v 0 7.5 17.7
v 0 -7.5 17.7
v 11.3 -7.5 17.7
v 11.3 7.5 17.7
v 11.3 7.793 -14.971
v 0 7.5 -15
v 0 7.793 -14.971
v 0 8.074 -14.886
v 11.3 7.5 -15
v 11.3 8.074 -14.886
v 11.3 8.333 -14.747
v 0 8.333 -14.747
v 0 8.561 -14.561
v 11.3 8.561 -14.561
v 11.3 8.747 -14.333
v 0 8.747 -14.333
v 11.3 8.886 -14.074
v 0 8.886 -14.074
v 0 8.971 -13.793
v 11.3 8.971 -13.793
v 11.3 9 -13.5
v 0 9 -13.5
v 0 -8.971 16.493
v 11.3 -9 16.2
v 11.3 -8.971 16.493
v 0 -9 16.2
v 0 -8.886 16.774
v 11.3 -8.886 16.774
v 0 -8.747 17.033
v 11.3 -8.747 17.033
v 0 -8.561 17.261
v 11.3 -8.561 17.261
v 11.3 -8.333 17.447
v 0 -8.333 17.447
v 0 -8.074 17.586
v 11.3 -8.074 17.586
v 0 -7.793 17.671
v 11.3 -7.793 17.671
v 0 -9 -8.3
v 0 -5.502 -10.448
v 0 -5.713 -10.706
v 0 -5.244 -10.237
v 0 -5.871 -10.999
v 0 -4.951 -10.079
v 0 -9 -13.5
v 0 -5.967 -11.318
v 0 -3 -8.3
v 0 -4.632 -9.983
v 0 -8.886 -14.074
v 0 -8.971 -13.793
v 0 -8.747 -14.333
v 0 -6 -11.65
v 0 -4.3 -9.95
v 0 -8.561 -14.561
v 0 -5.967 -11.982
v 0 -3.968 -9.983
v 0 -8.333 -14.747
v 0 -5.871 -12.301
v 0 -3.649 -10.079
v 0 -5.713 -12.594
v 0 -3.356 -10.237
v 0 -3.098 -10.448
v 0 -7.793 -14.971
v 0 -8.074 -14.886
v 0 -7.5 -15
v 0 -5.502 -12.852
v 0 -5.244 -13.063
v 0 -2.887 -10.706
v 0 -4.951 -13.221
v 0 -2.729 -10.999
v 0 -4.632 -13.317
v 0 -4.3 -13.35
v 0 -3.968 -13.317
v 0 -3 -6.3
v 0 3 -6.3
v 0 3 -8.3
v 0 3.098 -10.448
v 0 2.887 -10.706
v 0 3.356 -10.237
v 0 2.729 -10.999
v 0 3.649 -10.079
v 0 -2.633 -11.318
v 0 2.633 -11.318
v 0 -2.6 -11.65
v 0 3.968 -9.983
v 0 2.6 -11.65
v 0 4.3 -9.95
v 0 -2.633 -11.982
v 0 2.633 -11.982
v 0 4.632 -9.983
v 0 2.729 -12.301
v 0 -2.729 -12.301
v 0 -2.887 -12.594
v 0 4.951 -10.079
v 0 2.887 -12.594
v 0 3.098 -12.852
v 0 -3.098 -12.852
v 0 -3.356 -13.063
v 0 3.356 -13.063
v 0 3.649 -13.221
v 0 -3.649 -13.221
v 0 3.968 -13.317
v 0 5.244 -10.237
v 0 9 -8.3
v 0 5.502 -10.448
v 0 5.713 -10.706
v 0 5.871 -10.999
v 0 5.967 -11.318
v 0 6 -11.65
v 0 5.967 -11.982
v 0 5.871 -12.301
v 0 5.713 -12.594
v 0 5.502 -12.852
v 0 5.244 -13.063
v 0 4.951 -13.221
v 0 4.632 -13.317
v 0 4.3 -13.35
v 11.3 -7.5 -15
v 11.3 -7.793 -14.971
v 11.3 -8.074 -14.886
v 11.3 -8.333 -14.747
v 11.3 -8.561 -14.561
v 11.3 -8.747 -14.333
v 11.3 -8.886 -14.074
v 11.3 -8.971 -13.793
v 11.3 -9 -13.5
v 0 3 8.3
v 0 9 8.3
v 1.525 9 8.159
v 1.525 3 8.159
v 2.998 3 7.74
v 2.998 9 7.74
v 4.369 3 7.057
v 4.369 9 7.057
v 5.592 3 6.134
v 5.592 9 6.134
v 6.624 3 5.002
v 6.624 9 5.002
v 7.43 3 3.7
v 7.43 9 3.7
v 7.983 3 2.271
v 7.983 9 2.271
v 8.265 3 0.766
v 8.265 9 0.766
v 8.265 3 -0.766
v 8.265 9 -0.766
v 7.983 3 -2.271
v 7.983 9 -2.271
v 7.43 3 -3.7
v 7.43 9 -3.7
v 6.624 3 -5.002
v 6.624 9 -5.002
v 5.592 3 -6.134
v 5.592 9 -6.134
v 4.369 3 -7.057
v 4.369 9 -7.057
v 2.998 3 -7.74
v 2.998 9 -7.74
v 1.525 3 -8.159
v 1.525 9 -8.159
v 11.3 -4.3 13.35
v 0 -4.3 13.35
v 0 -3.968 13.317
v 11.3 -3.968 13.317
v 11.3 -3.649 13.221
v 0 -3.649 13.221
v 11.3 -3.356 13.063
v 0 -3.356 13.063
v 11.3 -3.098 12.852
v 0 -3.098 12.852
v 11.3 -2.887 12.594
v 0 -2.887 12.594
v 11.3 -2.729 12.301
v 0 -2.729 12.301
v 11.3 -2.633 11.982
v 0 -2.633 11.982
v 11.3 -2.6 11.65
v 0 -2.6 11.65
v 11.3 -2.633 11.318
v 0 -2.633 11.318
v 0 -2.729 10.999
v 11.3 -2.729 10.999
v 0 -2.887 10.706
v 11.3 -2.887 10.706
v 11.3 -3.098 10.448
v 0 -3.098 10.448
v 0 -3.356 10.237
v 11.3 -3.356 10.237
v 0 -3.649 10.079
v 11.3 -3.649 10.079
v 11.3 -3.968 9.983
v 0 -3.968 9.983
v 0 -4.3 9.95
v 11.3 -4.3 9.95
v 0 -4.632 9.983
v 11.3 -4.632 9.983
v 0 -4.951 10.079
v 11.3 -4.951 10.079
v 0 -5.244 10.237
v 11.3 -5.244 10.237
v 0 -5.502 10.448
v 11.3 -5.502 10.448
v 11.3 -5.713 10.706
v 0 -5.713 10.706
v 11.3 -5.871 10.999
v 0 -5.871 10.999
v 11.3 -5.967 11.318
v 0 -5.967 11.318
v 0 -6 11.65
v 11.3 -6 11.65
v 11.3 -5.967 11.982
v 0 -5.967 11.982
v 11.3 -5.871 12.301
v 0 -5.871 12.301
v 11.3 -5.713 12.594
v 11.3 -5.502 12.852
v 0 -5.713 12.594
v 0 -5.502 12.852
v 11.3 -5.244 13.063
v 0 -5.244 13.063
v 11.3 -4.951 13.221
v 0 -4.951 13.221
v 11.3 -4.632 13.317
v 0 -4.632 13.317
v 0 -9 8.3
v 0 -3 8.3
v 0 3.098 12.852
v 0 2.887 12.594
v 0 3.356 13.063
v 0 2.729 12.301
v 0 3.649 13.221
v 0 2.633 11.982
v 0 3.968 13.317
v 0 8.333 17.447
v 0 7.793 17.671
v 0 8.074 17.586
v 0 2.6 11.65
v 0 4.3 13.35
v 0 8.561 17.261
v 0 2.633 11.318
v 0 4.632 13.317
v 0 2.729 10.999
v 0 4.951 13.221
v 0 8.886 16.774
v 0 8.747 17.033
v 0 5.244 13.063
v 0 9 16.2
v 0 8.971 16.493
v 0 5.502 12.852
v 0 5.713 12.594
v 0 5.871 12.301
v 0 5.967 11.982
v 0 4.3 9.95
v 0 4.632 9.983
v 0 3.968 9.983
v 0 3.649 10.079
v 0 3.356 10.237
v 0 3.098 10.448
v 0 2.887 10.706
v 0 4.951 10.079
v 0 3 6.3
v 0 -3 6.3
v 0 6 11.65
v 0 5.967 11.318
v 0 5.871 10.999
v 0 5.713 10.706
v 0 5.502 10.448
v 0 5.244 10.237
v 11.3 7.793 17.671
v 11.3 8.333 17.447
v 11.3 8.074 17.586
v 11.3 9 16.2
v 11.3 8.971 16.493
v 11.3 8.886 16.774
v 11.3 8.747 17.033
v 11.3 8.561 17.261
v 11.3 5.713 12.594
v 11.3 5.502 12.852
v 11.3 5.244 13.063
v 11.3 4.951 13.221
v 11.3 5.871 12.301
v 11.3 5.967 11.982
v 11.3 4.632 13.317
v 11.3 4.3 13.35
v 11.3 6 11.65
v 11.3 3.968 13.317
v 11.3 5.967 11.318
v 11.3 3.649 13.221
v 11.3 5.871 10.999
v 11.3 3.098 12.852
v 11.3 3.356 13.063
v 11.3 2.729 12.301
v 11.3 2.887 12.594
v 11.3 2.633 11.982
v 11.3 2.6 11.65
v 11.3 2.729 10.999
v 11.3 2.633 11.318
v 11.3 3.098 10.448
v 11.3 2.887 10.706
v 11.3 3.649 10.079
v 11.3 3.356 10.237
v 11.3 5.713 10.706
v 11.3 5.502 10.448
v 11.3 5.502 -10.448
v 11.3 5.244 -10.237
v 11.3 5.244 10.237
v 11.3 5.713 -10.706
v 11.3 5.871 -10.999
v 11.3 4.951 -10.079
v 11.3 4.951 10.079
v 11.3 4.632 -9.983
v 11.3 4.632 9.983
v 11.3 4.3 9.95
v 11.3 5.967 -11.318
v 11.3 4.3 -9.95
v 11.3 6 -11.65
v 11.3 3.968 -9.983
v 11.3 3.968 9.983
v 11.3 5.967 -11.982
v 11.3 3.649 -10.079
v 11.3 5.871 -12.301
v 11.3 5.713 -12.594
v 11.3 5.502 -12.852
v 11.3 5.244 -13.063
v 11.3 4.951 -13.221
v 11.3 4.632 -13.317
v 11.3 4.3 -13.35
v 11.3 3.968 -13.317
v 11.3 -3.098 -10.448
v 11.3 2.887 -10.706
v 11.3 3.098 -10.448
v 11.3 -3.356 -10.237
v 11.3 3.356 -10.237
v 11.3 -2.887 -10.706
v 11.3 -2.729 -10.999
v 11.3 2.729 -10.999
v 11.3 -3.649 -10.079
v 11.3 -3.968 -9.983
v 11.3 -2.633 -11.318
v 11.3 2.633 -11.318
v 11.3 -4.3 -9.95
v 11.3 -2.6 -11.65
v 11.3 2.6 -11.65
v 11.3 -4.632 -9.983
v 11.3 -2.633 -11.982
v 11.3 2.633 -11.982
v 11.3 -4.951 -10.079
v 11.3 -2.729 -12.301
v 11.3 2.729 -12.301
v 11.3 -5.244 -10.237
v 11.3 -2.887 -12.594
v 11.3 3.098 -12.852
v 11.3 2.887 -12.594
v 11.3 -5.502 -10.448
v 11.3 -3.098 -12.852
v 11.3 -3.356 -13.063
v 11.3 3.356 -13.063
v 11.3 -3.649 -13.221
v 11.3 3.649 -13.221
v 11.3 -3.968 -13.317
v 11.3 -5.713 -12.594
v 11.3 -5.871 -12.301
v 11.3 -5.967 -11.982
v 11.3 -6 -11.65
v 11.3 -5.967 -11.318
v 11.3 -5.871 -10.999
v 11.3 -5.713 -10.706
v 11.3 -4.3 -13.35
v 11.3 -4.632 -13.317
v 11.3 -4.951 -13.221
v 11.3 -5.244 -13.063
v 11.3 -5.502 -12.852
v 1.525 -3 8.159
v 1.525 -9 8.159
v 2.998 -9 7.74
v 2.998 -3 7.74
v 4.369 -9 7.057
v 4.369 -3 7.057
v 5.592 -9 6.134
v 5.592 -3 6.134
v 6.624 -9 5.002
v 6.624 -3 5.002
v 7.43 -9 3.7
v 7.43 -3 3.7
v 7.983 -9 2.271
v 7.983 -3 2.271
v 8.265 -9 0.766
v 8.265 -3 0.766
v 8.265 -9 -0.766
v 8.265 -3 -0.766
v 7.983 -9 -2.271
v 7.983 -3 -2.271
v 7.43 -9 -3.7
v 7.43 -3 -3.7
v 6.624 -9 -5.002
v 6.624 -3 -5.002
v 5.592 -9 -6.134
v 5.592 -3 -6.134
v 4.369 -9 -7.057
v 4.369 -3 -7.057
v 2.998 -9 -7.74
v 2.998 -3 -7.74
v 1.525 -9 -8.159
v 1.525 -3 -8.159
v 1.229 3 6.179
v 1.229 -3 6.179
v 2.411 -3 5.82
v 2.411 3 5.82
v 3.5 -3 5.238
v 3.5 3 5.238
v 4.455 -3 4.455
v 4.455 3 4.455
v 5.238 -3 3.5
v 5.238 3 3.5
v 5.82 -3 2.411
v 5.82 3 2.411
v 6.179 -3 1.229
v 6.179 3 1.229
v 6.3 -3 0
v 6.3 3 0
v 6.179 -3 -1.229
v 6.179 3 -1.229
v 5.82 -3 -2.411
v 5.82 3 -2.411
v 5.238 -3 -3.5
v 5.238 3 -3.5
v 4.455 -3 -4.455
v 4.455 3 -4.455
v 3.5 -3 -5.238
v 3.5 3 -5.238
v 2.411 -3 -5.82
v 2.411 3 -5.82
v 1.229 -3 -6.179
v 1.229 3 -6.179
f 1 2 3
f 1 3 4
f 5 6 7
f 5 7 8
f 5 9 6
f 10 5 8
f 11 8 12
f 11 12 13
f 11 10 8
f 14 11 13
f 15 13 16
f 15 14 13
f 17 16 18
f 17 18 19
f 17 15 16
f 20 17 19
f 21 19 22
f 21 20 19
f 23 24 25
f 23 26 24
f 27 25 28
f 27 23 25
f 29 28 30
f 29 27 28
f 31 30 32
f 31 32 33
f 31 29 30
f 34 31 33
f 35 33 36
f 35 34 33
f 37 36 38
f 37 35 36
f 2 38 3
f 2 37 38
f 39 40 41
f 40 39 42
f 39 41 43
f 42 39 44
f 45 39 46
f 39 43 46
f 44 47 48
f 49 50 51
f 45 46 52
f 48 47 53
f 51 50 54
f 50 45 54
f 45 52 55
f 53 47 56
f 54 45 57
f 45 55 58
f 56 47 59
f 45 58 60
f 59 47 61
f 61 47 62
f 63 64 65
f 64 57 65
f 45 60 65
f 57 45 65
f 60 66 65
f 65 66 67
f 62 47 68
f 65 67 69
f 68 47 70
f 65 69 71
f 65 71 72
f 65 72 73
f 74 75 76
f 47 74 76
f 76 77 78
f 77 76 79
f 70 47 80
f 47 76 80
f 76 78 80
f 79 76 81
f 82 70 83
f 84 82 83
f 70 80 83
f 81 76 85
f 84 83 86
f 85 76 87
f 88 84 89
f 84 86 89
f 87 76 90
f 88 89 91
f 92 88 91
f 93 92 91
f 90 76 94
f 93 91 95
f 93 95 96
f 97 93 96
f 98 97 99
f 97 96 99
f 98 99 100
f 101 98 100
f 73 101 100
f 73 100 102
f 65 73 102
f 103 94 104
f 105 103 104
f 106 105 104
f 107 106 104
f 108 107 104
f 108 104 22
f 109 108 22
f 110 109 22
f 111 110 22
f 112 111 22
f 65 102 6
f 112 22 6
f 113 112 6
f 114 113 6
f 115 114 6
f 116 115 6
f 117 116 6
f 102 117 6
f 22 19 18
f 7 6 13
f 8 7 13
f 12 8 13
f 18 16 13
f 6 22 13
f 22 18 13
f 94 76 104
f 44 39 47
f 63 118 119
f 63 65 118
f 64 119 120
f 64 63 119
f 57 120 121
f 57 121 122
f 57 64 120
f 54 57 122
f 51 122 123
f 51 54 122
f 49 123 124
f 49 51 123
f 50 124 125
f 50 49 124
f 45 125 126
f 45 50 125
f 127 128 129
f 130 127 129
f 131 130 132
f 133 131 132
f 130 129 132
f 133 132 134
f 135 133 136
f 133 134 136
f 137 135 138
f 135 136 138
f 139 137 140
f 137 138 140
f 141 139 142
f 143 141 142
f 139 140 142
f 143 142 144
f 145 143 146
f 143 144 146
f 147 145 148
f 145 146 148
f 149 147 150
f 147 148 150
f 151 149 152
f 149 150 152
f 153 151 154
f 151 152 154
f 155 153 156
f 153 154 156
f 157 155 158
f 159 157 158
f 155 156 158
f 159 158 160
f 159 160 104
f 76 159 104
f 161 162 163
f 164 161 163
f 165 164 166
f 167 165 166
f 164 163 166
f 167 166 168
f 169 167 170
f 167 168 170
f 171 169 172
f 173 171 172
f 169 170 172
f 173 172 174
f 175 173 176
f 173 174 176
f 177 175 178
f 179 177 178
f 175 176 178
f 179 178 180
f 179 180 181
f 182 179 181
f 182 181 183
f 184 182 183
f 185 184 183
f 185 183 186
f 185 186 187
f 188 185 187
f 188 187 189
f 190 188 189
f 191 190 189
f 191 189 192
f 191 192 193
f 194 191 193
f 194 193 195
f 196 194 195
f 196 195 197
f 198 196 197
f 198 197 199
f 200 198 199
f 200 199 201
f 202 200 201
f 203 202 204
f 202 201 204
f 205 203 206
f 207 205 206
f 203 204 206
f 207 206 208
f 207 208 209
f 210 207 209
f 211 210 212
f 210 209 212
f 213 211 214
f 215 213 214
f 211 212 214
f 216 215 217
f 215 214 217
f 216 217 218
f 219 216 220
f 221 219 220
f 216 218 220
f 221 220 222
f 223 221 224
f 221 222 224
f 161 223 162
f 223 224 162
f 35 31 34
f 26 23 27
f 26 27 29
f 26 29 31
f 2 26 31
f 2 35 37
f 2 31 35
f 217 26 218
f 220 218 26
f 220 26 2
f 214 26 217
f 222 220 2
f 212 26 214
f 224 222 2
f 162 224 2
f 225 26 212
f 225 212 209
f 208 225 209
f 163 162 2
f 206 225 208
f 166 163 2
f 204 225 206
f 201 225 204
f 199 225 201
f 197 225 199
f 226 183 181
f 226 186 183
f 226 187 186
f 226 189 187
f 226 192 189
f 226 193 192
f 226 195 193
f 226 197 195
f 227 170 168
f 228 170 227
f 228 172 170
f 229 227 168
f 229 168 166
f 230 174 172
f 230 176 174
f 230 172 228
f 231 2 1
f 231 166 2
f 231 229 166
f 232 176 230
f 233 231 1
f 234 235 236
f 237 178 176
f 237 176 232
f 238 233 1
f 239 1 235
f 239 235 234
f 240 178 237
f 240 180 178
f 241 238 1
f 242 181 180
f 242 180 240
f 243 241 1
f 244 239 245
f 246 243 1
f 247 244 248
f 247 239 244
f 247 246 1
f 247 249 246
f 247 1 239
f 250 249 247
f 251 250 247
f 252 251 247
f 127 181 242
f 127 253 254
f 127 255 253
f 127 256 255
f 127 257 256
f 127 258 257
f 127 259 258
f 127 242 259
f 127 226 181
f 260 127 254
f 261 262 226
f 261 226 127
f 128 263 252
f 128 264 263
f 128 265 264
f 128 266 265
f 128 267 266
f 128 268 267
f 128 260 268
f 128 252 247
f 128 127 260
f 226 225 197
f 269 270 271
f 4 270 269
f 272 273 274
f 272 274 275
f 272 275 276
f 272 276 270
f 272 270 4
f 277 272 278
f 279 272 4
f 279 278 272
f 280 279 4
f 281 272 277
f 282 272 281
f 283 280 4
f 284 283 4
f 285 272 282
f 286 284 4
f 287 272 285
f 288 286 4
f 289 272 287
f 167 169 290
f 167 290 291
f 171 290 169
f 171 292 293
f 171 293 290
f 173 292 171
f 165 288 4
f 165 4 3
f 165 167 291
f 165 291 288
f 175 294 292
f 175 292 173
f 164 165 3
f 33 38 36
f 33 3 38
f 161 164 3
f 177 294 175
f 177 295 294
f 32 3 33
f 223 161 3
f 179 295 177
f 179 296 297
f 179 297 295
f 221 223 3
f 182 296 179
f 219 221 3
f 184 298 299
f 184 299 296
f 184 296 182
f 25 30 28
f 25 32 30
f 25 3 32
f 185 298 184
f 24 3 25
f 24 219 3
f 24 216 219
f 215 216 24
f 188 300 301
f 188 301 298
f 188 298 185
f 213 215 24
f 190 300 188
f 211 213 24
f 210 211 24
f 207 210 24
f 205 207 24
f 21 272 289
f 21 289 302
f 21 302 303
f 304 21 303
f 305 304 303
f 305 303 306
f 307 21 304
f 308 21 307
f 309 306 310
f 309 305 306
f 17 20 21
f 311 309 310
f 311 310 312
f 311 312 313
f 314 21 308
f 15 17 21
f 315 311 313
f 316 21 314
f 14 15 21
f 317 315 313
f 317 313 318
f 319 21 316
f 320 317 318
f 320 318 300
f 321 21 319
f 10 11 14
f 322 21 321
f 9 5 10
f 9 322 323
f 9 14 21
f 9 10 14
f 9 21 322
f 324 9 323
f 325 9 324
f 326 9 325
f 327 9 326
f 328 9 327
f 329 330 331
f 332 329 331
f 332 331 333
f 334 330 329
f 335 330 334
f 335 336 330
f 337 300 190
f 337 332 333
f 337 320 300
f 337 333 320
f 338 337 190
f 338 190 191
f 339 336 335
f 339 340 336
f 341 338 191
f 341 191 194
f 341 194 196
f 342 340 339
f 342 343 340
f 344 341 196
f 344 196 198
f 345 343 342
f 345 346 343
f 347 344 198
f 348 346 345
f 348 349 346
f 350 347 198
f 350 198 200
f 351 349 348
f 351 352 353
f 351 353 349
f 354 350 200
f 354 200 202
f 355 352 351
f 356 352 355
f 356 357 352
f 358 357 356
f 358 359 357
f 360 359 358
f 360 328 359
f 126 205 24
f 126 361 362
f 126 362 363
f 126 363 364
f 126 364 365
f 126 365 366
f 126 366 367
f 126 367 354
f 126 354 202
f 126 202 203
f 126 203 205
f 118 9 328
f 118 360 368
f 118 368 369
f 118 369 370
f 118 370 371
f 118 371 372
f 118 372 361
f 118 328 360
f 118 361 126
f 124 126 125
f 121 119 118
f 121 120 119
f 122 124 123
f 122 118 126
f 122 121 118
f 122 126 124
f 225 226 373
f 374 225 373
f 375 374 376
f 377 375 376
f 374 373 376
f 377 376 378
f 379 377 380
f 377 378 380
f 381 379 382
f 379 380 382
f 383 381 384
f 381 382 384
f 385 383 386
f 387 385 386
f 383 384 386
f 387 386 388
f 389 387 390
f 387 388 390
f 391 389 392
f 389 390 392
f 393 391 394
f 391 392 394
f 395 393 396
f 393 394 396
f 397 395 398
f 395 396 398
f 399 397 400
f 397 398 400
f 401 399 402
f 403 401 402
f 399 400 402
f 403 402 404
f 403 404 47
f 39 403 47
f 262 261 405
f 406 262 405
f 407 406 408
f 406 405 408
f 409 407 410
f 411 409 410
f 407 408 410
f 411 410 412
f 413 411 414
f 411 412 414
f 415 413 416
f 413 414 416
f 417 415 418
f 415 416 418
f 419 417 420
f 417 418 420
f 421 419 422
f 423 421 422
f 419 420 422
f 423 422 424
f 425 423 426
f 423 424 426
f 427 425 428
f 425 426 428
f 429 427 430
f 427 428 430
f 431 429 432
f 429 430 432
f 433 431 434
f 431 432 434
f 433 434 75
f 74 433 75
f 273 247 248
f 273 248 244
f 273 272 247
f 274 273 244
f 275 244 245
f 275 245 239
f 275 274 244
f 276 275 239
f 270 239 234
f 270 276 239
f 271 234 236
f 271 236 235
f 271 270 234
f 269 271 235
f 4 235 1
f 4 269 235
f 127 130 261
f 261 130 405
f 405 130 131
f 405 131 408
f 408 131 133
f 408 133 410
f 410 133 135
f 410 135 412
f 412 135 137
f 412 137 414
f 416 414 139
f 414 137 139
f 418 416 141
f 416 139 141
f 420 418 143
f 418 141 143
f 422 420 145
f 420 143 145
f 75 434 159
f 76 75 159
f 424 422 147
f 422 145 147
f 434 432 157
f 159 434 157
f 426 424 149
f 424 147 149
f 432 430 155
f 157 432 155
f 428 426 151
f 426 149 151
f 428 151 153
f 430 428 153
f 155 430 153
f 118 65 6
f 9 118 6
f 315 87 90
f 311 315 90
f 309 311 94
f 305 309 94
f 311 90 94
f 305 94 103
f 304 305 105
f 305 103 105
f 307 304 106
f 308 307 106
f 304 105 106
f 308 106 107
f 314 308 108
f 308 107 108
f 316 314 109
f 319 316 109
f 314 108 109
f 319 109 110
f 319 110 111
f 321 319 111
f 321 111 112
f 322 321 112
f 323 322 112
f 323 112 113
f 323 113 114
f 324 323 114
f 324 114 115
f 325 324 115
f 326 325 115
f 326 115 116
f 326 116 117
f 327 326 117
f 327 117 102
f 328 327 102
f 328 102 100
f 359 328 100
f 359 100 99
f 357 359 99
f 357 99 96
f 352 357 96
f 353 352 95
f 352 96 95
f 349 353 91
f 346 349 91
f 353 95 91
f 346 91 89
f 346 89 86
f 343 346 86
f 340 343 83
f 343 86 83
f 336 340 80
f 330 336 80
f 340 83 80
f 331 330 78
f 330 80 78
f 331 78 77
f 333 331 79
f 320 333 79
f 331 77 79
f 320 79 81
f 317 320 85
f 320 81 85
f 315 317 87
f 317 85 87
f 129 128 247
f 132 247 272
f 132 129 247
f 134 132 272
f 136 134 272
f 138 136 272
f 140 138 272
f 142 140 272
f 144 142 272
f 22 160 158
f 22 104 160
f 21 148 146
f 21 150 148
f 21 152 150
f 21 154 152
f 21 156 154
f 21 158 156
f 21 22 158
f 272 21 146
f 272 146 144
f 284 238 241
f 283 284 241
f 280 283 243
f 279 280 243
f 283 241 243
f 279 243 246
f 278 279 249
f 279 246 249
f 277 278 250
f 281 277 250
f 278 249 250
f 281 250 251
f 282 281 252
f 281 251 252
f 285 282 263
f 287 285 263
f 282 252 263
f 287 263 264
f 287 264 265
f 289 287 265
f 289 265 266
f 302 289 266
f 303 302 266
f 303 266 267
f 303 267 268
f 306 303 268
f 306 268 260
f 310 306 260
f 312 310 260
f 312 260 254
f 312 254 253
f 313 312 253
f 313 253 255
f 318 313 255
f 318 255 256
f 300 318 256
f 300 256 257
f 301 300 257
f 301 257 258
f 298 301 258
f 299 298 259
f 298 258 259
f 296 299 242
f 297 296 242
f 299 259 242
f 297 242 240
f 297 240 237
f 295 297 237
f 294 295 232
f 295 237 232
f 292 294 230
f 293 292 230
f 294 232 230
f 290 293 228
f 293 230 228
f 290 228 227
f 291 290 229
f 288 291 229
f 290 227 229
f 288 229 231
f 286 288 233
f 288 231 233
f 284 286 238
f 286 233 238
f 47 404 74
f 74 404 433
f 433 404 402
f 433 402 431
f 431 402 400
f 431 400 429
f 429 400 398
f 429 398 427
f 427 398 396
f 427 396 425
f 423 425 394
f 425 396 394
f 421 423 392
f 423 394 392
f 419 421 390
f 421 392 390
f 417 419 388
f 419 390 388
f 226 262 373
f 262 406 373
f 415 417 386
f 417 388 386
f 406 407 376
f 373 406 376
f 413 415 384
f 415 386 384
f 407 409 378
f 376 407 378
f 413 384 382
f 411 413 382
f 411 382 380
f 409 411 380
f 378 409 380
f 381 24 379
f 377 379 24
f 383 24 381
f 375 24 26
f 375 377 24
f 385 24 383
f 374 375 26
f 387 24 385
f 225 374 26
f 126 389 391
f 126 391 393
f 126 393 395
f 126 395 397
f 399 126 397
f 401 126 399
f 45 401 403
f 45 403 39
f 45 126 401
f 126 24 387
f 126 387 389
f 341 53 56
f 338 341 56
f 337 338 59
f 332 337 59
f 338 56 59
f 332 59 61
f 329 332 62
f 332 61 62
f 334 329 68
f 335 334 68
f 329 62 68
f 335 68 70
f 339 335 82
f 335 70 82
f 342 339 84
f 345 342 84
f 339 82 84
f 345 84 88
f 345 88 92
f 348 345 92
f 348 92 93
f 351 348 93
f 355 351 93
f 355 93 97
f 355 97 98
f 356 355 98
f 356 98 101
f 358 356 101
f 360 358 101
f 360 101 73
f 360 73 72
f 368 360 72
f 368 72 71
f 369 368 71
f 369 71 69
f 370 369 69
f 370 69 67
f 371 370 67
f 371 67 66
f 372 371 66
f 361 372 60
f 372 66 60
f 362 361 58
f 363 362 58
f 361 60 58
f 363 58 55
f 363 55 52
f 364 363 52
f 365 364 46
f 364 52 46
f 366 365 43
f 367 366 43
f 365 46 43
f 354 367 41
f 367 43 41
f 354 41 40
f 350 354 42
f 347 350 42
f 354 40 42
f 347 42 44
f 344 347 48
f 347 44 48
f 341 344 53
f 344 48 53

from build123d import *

# Parameters (mm, degrees)
SKETCH8_W           = 30
SKETCH8_H           = 100
BOSS_EXTRUDE1_DEPTH = 100
SKETCH9_W           = 88.7
SKETCH9_H           = 30
CUT_EXTRUDE1_DEPTH  = 103.708324882
SKETCH10_R          = 1.7
CUT_EXTRUDE2_DEPTH  = 21.825225089
MOVE_FACE1_BY       = 2.7
FILLET1_R           = 1.5


with BuildPart() as part:
    # Sketch8 → Boss-Extrude1 (new body)
    with BuildSketch(Plane(origin=(0, 0, 0), x_dir=(0, 0, -1), z_dir=(1, 0, 0))):
        Rectangle(SKETCH8_W, SKETCH8_H)
    extrude(amount=BOSS_EXTRUDE1_DEPTH)

    # Sketch7 → Cut-Revolve3 (revolve, cut)
    with BuildSketch(Plane(origin=(0, 0, 0), x_dir=(0, 0, -1), z_dir=(1, 0, 0))):
        Polygon((-8.3, 9), (-150, 9), (-150, 50), (0, 50), (0, -50), (-150, -50), (-150, -9), (-8.3, -9), (-8.3, -3), (-6.3, -3), (-6.3, 3), (-8.3, 3), align=None)
    revolve(axis=Axis((0, -50, 0), (0, 1, 0)), mode=Mode.SUBTRACT)

    # Sketch9 → Cut-Extrude1 (cut, through all)
    with BuildSketch(Plane(origin=(0, 9, 0), x_dir=(1, 0, 0), z_dir=(0, 1, 0))):
        with Locations((55.65, 0)):
            Rectangle(SKETCH9_W, SKETCH9_H)
    extrude(amount=-CUT_EXTRUDE1_DEPTH, mode=Mode.SUBTRACT)

    # Sketch10 → Cut-Extrude2 (cut, through all)
    with BuildSketch(Plane.ZY):
        with Locations((-11.65, 4.3)):
            Circle(SKETCH10_R)
        with Locations((-11.65, -4.3)):
            Circle(SKETCH10_R)
        with Locations((11.65, -4.3)):
            Circle(SKETCH10_R)
        with Locations((11.65, 4.3)):
            Circle(SKETCH10_R)
    extrude(amount=-CUT_EXTRUDE2_DEPTH, mode=Mode.SUBTRACT)

    # Move Face1: a face moved outward by 2.7
    extrude(part.faces().sort_by_distance((5.65, 0, 15))[0], amount=MOVE_FACE1_BY, dir=(0, 0, 1))

    # Fillet1
    fillet1_edges = [part.edges().sort_by_distance(p)[0] for p in [
        (5.65, 9, 17.7),
        (5.65, -9, -15),
        (5.65, -9, 17.7),
        (5.65, 9, -15),
    ]]
    fillet(fillet1_edges, radius=FILLET1_R)


solid = part.part
